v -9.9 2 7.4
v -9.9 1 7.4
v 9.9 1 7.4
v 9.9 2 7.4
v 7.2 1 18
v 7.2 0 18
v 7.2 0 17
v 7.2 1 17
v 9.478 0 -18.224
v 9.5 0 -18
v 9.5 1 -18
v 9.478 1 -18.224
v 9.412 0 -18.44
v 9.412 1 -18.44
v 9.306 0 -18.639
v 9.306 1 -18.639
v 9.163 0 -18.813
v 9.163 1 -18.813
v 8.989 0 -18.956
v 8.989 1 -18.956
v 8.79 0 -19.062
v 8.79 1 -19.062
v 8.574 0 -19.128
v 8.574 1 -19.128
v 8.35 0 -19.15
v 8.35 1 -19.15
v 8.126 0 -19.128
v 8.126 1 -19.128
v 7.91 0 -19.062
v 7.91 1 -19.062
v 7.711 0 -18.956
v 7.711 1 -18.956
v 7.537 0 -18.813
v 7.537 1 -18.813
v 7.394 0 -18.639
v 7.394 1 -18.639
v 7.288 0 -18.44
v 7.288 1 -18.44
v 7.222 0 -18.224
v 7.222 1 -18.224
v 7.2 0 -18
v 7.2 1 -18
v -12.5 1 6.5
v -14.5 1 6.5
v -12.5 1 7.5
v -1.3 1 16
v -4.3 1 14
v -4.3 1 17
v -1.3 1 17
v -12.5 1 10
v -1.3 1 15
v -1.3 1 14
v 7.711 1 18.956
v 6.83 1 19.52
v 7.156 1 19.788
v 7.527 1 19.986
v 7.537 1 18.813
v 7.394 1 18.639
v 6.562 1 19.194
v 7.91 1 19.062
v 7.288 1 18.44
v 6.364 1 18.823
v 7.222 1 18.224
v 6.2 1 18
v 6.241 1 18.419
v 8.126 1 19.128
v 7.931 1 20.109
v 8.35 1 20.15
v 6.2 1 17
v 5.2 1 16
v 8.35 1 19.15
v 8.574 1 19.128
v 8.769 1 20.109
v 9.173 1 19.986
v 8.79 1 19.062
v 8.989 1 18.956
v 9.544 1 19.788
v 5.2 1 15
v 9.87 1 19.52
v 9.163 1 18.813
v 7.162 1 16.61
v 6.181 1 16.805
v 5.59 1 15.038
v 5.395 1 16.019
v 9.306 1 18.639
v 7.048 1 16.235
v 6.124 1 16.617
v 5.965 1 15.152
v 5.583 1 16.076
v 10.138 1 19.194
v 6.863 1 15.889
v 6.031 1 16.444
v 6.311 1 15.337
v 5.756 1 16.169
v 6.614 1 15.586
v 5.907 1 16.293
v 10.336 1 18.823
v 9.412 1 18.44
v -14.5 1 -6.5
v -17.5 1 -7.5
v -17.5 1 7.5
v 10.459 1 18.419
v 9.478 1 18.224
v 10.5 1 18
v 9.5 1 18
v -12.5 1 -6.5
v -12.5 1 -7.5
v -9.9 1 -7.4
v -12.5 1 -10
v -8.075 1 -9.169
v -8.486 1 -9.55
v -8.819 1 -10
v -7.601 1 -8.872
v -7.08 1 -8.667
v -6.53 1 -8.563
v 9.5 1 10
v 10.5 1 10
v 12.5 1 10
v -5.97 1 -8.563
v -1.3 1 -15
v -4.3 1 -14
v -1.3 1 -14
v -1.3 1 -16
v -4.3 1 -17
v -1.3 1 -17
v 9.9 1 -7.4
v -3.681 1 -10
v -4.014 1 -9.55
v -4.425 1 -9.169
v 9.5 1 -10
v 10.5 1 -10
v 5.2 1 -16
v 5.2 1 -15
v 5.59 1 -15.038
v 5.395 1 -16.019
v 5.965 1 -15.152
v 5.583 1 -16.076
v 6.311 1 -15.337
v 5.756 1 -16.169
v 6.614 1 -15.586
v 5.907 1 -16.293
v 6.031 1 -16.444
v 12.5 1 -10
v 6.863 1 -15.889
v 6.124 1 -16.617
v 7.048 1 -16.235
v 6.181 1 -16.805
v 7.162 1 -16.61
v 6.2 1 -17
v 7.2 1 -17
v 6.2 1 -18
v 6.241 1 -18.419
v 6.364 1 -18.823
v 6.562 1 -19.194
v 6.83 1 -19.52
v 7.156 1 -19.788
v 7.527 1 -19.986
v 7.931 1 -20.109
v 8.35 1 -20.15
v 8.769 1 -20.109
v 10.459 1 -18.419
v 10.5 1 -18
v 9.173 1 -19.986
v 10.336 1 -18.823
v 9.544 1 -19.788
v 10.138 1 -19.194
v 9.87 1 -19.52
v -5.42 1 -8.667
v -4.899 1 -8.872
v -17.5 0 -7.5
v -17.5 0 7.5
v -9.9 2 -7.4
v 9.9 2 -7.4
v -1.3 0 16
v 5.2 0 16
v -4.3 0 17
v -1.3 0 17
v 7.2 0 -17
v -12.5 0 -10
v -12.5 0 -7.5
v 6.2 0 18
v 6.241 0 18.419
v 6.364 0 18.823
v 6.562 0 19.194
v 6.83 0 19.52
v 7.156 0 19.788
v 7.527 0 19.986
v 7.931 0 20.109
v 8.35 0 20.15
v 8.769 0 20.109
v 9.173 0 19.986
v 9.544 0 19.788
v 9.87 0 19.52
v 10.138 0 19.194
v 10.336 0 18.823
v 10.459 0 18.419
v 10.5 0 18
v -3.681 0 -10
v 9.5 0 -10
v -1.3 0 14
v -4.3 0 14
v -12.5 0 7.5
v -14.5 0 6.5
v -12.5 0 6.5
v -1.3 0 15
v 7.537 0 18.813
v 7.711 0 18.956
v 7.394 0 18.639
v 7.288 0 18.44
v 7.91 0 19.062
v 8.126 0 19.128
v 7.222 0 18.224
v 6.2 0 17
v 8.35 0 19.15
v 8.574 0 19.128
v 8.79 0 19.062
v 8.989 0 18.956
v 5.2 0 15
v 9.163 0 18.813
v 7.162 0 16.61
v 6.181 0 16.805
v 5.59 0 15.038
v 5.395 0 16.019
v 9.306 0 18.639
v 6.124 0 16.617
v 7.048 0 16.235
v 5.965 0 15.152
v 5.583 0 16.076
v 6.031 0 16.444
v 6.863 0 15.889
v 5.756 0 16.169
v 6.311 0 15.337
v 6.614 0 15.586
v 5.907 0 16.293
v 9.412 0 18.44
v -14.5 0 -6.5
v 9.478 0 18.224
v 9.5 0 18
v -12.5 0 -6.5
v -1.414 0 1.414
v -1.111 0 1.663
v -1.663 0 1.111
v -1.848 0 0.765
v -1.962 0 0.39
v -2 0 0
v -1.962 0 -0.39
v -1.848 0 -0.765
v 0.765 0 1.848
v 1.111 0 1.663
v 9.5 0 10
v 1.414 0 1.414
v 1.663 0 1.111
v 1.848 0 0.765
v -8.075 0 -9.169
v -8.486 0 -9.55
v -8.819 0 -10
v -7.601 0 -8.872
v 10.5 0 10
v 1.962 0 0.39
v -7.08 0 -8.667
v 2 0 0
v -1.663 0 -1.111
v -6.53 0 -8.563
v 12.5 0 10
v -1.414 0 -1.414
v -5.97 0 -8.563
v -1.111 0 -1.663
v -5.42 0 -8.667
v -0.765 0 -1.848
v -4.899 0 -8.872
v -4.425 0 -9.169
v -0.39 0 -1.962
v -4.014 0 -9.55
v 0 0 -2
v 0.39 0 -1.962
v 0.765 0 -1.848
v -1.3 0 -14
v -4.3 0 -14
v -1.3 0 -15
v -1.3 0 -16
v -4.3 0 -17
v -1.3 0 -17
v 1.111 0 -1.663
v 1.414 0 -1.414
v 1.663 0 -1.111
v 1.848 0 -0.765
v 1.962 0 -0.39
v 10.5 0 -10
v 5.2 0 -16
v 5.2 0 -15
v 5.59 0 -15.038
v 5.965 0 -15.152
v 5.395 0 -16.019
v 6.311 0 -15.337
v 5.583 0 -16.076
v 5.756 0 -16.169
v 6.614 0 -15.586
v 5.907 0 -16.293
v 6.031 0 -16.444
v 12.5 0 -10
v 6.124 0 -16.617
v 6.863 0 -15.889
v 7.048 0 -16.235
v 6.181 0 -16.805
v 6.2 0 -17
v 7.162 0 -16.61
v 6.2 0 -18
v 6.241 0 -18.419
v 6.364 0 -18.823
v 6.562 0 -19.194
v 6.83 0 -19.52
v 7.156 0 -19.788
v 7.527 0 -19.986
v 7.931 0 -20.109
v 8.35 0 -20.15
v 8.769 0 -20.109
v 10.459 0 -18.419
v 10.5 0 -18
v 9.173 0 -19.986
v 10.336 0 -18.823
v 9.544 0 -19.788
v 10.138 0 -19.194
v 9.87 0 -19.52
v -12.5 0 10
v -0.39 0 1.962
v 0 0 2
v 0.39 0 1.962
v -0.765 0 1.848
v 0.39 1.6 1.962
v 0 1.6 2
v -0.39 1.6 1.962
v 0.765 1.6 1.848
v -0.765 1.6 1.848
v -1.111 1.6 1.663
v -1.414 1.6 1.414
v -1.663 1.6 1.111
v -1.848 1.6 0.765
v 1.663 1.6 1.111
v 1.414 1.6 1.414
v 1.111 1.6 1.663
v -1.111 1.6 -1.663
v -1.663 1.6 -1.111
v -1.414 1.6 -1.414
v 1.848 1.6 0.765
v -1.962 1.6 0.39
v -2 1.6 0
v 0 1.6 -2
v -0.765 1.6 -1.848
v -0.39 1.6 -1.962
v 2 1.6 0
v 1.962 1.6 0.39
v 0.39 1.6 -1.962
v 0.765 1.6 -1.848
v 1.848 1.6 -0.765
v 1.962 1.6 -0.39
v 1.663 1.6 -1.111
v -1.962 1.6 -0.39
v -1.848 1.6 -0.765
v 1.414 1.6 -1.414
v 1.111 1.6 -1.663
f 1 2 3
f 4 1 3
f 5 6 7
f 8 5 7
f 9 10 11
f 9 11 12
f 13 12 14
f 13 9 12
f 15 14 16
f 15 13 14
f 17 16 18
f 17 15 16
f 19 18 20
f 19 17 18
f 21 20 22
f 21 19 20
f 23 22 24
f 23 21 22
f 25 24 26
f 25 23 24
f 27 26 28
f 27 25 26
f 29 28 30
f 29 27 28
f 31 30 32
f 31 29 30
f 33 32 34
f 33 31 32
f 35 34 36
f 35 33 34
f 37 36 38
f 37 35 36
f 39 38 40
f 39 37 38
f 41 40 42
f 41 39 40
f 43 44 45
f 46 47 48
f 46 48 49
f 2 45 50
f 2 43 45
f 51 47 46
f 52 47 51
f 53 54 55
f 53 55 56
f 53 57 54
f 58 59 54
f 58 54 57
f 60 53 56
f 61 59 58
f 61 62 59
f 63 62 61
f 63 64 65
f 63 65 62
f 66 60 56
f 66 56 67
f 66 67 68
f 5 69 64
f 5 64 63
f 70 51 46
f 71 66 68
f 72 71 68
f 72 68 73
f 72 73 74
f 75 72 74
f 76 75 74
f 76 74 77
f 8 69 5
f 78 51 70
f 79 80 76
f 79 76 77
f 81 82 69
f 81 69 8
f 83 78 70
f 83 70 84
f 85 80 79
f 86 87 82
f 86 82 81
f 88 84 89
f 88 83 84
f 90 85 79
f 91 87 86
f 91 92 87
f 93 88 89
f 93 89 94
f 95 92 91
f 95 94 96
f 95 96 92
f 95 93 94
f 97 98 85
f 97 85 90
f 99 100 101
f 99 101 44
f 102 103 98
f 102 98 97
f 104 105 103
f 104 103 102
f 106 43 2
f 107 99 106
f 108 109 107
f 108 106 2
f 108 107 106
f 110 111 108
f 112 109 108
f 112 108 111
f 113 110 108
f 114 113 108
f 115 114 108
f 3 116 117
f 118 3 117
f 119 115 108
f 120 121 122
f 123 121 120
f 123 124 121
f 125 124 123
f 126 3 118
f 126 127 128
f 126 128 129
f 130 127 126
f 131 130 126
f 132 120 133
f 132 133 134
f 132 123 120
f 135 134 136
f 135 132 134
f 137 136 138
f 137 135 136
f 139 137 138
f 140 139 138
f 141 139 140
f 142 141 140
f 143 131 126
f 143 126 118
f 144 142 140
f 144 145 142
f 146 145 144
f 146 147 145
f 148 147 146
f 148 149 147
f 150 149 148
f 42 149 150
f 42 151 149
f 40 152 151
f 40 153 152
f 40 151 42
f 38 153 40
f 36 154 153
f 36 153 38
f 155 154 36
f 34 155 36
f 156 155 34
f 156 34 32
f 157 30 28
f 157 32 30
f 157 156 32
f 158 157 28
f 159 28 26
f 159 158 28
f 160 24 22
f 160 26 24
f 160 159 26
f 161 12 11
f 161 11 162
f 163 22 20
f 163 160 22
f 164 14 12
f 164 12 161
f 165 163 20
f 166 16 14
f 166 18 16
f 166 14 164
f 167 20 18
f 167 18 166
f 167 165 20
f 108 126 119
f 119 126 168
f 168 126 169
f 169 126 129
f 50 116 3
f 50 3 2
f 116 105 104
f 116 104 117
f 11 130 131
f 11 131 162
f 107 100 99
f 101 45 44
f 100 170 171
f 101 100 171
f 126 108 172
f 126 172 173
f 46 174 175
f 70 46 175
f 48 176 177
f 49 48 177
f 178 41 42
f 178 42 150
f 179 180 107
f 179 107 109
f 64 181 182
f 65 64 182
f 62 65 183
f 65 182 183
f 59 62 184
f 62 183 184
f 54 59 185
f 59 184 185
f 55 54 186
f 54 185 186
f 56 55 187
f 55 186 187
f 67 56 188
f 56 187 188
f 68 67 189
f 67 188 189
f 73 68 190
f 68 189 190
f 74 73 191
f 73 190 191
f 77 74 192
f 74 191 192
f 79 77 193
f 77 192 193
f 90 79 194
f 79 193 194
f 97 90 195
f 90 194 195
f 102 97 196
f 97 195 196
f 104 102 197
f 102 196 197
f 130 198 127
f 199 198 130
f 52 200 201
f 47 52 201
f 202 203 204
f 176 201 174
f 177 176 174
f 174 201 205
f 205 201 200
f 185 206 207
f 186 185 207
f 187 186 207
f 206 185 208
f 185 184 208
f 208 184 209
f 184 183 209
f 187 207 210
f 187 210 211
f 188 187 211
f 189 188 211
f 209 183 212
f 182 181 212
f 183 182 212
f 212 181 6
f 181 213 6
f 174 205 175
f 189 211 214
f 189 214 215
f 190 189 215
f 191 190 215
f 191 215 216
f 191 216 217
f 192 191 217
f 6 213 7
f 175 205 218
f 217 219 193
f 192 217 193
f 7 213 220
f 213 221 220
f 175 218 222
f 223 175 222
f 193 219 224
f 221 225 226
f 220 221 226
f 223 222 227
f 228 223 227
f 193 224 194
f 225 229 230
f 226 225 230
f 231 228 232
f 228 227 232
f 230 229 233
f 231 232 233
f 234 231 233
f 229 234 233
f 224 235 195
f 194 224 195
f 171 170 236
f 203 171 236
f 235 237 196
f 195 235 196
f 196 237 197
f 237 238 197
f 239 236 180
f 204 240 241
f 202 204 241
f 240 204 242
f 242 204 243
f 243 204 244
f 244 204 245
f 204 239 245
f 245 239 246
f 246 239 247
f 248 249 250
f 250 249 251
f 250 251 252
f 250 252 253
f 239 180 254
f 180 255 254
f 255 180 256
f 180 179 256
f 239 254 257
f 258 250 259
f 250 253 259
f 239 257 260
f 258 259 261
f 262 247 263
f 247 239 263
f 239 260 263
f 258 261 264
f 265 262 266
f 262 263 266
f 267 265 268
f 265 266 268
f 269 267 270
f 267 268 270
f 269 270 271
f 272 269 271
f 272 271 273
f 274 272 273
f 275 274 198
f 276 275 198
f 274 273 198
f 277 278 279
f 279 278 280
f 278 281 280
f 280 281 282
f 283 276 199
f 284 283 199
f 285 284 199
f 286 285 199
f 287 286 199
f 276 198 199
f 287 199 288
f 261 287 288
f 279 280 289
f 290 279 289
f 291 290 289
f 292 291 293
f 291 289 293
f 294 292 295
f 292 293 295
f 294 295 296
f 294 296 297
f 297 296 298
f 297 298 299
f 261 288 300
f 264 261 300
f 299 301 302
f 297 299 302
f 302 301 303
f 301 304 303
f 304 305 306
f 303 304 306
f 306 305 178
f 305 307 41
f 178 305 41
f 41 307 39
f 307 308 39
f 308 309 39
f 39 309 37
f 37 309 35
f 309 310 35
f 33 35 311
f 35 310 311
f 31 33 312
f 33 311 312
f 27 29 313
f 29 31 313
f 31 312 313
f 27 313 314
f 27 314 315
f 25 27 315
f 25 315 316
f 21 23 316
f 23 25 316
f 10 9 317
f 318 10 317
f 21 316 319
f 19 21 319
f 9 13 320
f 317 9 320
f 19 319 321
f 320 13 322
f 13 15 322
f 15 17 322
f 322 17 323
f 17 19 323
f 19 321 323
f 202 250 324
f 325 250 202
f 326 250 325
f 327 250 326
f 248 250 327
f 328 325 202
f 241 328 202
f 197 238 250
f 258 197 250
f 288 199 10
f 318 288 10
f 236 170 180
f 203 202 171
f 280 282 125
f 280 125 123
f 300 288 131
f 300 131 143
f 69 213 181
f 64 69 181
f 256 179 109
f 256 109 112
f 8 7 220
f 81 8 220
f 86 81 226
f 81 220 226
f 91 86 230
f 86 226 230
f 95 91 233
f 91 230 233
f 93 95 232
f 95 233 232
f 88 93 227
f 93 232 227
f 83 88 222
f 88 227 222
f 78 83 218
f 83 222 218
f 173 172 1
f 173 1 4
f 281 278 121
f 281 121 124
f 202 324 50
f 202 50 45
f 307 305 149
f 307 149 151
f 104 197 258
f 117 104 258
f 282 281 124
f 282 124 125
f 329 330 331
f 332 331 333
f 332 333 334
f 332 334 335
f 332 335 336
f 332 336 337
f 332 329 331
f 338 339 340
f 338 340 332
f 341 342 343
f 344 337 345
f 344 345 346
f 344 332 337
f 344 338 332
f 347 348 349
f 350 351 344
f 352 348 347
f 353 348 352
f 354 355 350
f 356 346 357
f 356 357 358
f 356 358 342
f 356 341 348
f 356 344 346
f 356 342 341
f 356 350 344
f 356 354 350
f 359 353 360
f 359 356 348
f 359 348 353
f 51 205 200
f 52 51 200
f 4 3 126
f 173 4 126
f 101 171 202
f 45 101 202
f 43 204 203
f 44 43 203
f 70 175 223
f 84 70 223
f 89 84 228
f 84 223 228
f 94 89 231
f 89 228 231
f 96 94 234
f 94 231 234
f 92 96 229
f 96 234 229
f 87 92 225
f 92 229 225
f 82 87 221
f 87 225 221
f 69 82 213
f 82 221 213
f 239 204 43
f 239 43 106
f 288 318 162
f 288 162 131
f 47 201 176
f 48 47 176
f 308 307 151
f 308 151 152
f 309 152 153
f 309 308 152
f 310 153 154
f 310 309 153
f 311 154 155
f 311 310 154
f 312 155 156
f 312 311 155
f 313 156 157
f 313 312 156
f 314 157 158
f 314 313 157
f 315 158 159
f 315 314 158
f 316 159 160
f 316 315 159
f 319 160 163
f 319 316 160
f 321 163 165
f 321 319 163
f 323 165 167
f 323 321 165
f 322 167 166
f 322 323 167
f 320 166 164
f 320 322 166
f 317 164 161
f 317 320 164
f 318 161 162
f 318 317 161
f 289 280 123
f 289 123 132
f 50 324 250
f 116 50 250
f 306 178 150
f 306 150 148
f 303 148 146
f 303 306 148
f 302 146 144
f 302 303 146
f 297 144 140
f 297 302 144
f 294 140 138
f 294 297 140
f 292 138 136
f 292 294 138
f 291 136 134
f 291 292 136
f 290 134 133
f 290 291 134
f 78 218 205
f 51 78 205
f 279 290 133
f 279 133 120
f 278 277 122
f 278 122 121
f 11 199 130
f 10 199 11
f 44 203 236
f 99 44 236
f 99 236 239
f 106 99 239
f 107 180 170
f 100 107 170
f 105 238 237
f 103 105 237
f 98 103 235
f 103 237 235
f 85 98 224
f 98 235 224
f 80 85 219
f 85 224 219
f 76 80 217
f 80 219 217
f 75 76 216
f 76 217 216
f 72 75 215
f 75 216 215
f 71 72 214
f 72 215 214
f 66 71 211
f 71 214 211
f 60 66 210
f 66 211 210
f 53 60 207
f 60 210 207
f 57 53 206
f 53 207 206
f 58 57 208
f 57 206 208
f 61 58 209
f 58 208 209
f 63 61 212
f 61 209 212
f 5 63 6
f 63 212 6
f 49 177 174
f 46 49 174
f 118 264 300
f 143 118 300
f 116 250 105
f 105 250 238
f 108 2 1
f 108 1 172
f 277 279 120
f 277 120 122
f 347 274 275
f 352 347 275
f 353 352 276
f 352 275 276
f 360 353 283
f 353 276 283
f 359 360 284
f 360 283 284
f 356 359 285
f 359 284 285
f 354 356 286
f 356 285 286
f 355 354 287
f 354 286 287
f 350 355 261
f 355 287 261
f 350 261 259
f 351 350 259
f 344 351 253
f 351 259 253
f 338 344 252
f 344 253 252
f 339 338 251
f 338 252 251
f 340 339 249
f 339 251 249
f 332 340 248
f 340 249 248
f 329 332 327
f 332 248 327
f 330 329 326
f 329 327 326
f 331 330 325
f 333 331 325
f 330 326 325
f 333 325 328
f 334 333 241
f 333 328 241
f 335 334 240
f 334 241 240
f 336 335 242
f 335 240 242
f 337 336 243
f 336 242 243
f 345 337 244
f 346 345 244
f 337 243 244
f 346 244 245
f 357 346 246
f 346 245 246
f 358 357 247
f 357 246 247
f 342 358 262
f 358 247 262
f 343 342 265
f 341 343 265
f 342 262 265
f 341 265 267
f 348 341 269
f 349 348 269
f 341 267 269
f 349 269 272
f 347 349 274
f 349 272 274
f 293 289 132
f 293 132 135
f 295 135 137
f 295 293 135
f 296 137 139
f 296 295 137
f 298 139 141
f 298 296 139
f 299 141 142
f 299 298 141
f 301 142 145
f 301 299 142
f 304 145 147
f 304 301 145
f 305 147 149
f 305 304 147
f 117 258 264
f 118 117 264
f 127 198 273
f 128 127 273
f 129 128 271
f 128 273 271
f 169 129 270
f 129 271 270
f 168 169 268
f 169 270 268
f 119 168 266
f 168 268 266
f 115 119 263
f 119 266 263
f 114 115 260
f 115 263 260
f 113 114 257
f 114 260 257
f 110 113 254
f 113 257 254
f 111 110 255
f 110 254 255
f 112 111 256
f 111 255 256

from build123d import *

# Parameters (mm, degrees)
SKETCH_1_W          = 25
SKETCH_1_H          = 20
EXTRUDE_1_DEPTH     = 1
EXTRUDE_2_DEPTH     = 1
EXTRUDE_3_DEPTH     = 1
SKETCH_5_W          = 19.8
SKETCH_5_H          = 14.8
EXTRUDE_4_DEPTH     = 1
SKETCH_6_R          = 2
CUT_EXTRUDE_2_DEPTH = 1.6
SKETCH_7_R          = 3
CUT_EXTRUDE_3_DEPTH = 1


with BuildPart() as part:
    # Эскиз1 → Бобышка-Вытянуть1 (new body)
    with BuildSketch(Plane(origin=(0, 0, 0), x_dir=(1, 0, 0), z_dir=(0, 1, 0))):
        Rectangle(SKETCH_1_W, SKETCH_1_H)
    extrude(amount=EXTRUDE_1_DEPTH)

    # Эскиз3 → Бобышка-Вытянуть2 (add)
    with BuildSketch(Plane(origin=(0, 0, 0), x_dir=(1, 0, 0), z_dir=(0, 1, 0))):
        Polygon((-14.5, 7.5), (-17.5, 7.5), (-17.5, -7.5), (-14.5, -7.5), (-12.5, -7.5), (-12.5, -6.5), (-14.5, -6.5), (-14.5, 6.5), (-12.5, 6.5), (-12.5, 7.5), align=None)
    extrude(amount=EXTRUDE_2_DEPTH)

    # Эскиз4 → Бобышка-Вытянуть3 (add)
    with BuildSketch(Plane(origin=(0, 0, 0), x_dir=(1, 0, 0), z_dir=(0, 1, 0))):
        with BuildLine():
            Line((9.5, 10), (9.5, 18))
            ThreePointArc((9.5, 18), (8.35, 19.15), (7.2, 18))
            Line((7.2, 18), (7.2, 17))
            ThreePointArc((7.2, 17), (6.614213562, 15.585786438), (5.2, 15))
            Line((5.2, 15), (-1.3, 15))
            Line((-1.3, 15), (-1.3, 14))
            Line((-1.3, 14), (-4.3, 14))
            Line((-4.3, 14), (-4.3, 17))
            Line((-4.3, 17), (-1.3, 17))
            Line((-1.3, 17), (-1.3, 16))
            Line((-1.3, 16), (5.2, 16))
            ThreePointArc((5.2, 16), (5.907106781, 16.292893219), (6.2, 17))
            Line((6.2, 17), (6.2, 18))
            ThreePointArc((6.2, 18), (8.35, 20.15), (10.5, 18))
            Line((10.5, 18), (10.5, 10))
            Line((10.5, 10), (9.5, 10))
        make_face()
        with BuildLine():
            Line((-4.3, -14), (-4.3, -17))
            Line((-4.3, -17), (-1.3, -17))
            Line((-1.3, -17), (-1.3, -16))
            Line((-1.3, -16), (5.2, -16))
            ThreePointArc((5.2, -16), (5.907106781, -16.292893219), (6.2, -17))
            Line((6.2, -17), (6.2, -18))
            ThreePointArc((6.2, -18), (8.35, -20.15), (10.5, -18))
            Line((10.5, -18), (10.5, -10))
            Line((10.5, -10), (9.5, -10))
            Line((9.5, -10), (9.5, -18))
            ThreePointArc((9.5, -18), (8.35, -19.15), (7.2, -18))
            Line((7.2, -18), (7.2, -17))
            ThreePointArc((7.2, -17), (6.614213562, -15.585786438), (5.2, -15))
            Line((5.2, -15), (-1.3, -15))
            Line((-1.3, -15), (-1.3, -14))
            Line((-1.3, -14), (-4.3, -14))
        make_face()
    extrude(amount=EXTRUDE_3_DEPTH)

    # Эскиз5 → Бобышка-Вытянуть4 (add)
    with BuildSketch(Plane(origin=(0, 1, 0), x_dir=(1, 0, 0), z_dir=(0, 1, 0))):
        Rectangle(SKETCH_5_W, SKETCH_5_H)
    extrude(amount=EXTRUDE_4_DEPTH)

    # Эскиз6 → Вырез-Вытянуть2 (cut)
    with BuildSketch(Plane.XZ):
        with Locations(Location((0, 0, 0), (0, 0, 270))):
            Circle(SKETCH_6_R)
    extrude(amount=-CUT_EXTRUDE_2_DEPTH, mode=Mode.SUBTRACT)

    # Эскиз7 → Вырез-Вытянуть3 (cut)
    with BuildSketch(Plane.XZ):
        with Locations((-6.25, -11.55)):
            Circle(SKETCH_7_R)
    extrude(amount=-CUT_EXTRUDE_3_DEPTH, mode=Mode.SUBTRACT)


solid = part.part
